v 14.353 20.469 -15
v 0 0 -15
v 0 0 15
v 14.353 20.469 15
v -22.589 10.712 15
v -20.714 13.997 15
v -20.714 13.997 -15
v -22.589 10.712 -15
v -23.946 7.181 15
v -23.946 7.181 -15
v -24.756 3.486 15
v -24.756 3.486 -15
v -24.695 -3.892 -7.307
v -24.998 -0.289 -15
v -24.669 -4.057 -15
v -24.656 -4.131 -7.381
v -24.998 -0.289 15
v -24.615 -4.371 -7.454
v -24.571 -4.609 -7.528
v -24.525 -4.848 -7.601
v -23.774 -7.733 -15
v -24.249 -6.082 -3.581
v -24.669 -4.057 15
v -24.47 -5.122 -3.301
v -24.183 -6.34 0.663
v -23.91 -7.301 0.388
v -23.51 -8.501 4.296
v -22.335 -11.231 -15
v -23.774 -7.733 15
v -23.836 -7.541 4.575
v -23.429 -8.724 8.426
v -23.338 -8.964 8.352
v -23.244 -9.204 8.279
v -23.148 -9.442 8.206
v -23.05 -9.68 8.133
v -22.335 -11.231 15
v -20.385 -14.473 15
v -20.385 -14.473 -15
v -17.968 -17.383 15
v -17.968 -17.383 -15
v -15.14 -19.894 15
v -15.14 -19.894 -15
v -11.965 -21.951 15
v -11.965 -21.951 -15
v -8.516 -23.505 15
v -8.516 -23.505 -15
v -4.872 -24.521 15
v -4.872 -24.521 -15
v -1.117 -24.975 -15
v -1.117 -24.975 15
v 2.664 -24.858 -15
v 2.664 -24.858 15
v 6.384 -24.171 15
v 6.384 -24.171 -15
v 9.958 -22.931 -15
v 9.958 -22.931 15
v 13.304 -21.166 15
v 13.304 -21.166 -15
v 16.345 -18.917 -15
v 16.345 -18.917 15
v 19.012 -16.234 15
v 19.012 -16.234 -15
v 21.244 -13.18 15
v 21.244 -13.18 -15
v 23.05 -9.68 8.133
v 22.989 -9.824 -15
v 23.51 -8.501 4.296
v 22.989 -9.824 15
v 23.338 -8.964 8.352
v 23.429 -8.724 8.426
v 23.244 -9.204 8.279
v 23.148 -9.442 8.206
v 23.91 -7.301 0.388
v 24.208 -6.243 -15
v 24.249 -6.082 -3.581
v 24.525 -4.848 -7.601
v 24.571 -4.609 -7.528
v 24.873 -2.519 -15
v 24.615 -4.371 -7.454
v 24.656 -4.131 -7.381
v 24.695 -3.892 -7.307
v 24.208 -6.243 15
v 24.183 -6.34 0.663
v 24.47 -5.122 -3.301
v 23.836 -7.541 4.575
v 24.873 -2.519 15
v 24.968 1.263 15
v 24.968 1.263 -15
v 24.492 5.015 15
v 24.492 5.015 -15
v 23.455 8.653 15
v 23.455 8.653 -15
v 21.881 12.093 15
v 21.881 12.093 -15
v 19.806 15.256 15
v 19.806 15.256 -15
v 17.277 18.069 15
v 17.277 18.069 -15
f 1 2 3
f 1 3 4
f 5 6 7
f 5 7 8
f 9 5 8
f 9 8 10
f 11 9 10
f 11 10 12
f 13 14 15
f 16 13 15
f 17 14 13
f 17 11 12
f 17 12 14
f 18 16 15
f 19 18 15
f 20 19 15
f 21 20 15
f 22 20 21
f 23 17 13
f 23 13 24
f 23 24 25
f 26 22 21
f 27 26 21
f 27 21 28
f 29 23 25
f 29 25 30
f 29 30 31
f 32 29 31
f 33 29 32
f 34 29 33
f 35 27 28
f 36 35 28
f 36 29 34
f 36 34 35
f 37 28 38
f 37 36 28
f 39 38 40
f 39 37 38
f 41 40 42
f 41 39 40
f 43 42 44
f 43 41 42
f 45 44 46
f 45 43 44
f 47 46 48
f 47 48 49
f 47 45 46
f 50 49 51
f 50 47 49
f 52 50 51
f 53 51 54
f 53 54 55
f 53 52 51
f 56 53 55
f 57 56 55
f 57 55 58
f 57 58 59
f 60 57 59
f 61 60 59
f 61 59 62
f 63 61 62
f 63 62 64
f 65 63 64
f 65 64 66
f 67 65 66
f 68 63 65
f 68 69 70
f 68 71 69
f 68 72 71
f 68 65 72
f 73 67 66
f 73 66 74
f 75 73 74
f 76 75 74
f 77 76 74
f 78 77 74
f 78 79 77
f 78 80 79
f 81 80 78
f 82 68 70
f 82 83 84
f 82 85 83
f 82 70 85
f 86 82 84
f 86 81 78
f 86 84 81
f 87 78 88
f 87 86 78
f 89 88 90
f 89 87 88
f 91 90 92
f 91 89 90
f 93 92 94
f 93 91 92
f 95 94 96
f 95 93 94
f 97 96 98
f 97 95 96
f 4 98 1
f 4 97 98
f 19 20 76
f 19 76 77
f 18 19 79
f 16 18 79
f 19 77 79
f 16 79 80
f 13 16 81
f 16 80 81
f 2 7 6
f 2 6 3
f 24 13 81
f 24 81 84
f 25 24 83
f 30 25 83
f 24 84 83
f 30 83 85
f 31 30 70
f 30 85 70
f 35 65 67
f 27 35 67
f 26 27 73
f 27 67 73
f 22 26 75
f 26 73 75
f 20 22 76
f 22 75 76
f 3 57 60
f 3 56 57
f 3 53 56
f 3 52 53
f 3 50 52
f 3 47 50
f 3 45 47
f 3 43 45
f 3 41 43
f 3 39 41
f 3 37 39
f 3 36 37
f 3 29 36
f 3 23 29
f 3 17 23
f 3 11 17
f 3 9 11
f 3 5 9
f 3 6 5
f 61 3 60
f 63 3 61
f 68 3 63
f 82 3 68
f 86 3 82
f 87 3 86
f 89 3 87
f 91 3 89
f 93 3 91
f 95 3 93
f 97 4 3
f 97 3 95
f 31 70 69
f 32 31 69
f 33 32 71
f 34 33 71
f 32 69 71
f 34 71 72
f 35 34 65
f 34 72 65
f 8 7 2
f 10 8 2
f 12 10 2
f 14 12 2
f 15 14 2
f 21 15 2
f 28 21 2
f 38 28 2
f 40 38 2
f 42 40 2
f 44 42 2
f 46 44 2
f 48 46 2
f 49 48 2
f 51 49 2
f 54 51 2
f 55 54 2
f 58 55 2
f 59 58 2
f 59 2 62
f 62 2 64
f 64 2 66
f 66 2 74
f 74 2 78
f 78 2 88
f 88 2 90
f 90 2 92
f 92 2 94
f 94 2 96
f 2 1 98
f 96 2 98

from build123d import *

# Parameters (mm, degrees)
SKETCH1_R                    = 25
BOSS_EXTRUDE1_DEPTH          = 15
CUT_EXTRUDE1_DEPTH           = 30
CUT_EXTRUDE_THIN3_DEPTH      = 26
CUT_EXTRUDE_THIN3_DEPTH_BACK = 26


with BuildPart() as part:
    # Sketch1 → Boss-Extrude1 (new body, symmetric)
    with BuildSketch(Plane.XY):
        Circle(SKETCH1_R)
    extrude(amount=BOSS_EXTRUDE1_DEPTH, both=True)

    # Sketch2 → Cut-Extrude1 (cut)
    with BuildSketch(Plane.XY.offset(15)):
        Polygon((-128.64988892, 86.933618644), (-20.714125317, 13.997321614), (0, 0), (14.35317498, 20.469156504), (89.143728668, 127.128453183), (41.85899915, 383.338297472), (-175.934618438, 343.143462933), align=None)
    extrude(amount=-CUT_EXTRUDE1_DEPTH, mode=Mode.SUBTRACT)

    # Sketch4 → Cut-Extrude-Thin3 (cut, two sides)
    with BuildSketch(Plane(origin=(0, 0, 0), x_dir=(0, 0, -1), z_dir=(1, 0, 0))) as cut_extrude_thin3_sk:
        Polygon((-8.132669534, -9.679737666), (7.600765094, -4.847746507), (7.30718246, -3.891812808), (-8.426252168, -8.723803967), align=None)
    extrude(amount=CUT_EXTRUDE_THIN3_DEPTH, mode=Mode.SUBTRACT)
    extrude(cut_extrude_thin3_sk.sketch, amount=-CUT_EXTRUDE_THIN3_DEPTH_BACK, mode=Mode.SUBTRACT)


solid = part.part
